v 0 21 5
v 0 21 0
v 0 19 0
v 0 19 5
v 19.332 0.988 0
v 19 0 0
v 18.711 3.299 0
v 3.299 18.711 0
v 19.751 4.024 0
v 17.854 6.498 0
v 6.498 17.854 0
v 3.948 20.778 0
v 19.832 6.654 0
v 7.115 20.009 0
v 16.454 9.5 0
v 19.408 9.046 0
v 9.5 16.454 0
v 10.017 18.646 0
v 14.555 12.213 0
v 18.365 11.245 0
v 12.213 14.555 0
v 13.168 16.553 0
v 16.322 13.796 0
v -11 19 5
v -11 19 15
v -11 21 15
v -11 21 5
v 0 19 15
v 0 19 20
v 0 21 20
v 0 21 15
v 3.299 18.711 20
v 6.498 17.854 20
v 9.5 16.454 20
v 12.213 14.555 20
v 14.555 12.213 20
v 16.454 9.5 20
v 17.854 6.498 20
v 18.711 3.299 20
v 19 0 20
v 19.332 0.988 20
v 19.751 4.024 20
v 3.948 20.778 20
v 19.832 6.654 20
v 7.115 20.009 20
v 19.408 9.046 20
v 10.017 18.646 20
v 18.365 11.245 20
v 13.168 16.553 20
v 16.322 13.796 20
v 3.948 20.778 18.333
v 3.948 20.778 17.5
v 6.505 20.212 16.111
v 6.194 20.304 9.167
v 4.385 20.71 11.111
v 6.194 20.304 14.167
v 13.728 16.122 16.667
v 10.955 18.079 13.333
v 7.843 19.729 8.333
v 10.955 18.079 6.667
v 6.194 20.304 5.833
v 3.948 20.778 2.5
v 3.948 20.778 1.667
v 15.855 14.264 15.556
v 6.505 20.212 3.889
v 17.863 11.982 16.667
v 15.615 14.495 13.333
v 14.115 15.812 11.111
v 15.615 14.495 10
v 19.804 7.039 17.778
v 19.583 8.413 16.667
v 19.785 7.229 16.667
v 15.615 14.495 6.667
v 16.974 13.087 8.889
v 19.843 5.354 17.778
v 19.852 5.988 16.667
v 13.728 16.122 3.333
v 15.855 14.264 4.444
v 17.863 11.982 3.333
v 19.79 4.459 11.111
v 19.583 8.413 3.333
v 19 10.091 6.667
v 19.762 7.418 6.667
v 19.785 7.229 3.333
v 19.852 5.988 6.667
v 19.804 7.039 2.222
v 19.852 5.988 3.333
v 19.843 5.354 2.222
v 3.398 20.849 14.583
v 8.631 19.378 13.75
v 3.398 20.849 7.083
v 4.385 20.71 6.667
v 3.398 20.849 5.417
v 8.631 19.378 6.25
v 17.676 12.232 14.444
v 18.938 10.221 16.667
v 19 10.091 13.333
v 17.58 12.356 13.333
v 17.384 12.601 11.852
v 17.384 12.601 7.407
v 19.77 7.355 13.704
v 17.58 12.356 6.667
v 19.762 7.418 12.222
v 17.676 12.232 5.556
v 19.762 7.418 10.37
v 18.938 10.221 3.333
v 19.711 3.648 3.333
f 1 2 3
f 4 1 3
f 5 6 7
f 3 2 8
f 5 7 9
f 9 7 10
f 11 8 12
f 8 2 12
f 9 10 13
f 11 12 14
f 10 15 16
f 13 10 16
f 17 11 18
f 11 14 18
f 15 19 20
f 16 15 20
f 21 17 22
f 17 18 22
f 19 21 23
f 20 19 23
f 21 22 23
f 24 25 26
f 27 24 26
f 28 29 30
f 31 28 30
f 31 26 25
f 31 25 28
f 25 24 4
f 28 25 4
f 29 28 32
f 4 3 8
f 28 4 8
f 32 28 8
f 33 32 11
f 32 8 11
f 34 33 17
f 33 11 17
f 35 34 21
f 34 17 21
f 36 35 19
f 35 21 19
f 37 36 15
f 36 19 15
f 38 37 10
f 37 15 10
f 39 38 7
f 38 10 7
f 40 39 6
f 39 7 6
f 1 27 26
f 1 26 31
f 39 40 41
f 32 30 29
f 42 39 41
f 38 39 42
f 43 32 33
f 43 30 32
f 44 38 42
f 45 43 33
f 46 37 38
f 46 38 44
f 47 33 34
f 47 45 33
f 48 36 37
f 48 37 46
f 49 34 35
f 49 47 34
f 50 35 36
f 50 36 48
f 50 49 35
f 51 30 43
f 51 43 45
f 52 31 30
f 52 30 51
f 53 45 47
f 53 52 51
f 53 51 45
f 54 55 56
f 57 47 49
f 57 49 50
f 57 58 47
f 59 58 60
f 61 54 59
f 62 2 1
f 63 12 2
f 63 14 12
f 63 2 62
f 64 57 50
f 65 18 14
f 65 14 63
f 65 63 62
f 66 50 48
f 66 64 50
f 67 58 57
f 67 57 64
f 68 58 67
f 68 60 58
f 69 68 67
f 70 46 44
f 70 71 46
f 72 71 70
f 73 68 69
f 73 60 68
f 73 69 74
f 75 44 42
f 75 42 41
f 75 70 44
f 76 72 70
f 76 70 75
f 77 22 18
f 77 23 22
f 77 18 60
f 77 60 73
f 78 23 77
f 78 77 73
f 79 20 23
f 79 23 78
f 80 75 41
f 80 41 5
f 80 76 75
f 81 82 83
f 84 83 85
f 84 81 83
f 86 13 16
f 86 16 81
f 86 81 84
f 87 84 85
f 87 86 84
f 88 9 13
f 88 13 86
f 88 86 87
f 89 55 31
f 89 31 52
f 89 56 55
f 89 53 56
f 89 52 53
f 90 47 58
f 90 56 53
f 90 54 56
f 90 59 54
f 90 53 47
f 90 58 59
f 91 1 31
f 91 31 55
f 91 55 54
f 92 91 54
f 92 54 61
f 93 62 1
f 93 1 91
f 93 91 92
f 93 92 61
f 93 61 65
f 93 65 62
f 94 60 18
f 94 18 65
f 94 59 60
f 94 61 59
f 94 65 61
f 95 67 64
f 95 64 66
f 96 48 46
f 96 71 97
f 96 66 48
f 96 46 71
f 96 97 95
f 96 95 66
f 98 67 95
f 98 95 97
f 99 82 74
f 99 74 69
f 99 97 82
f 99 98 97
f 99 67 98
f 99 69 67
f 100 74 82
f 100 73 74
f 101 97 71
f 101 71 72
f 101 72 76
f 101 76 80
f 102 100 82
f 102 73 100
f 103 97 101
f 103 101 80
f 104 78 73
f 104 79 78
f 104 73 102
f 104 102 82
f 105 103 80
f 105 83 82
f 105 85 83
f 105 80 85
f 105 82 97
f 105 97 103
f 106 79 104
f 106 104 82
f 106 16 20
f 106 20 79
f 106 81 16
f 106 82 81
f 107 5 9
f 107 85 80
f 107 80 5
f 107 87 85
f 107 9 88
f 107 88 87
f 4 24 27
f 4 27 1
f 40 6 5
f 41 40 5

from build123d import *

# Parameters (mm, degrees)
F0_W     = 11
F0_H     = 2
F1_DEPTH = 20
F2_W     = 11
F2_H     = 2
F3_DEPTH = 5
F4_W     = 11
F4_H     = 2
F5_DEPTH = 5


# Not quite as in the source:
# - ends of sketch curves that miss each other by under 0.0002 mm in the source are joined


with BuildPart() as f1:
    # F0 (on Top) → F1 (new body)
    with BuildSketch(Plane.XY):
        with BuildLine():
            ThreePointArc((0, 19), (13.4350288425, 13.4350288425), (19, 0))
            Line((19, 0), (19.3316700079, 0.9884245321))
            add(Edge.make_bspline(
                [(0, 20.9999997169), (5.0418251194, 21.0644266307), (10.6034953843, 19.0446950586), (20.5243171722, 10.6653997718), (19.9493483466, 4.7892186912), (19.3316700079, 0.9884245321)],
                knots=[0, 0, 0, 0, 0.3345544691, 0.6691089382, 0.9528969744, 0.9528969744, 0.9528969744, 0.9528969744], degree=3))
            Line((0, 20.9999997169), (0, 19))
        make_face()
        with Locations((-5.5, 20)):
            Rectangle(F0_W, F0_H)
    extrude(amount=F1_DEPTH)

    # F2 (on face) → F3 (cut)
    with BuildSketch(Plane(origin=(0, 0, 0), x_dir=(1, 0, 0), z_dir=(0, 0, -1))):
        with Locations((-5.5, -20)):
            Rectangle(F2_W, F2_H)
    extrude(amount=-F3_DEPTH, mode=Mode.SUBTRACT)

    # F4 (on face) → F5 (cut)
    with BuildSketch(Plane.XY.offset(20)):
        with Locations((-5.5, 20)):
            Rectangle(F4_W, F4_H)
    extrude(amount=-F5_DEPTH, mode=Mode.SUBTRACT)


solid = f1.part
